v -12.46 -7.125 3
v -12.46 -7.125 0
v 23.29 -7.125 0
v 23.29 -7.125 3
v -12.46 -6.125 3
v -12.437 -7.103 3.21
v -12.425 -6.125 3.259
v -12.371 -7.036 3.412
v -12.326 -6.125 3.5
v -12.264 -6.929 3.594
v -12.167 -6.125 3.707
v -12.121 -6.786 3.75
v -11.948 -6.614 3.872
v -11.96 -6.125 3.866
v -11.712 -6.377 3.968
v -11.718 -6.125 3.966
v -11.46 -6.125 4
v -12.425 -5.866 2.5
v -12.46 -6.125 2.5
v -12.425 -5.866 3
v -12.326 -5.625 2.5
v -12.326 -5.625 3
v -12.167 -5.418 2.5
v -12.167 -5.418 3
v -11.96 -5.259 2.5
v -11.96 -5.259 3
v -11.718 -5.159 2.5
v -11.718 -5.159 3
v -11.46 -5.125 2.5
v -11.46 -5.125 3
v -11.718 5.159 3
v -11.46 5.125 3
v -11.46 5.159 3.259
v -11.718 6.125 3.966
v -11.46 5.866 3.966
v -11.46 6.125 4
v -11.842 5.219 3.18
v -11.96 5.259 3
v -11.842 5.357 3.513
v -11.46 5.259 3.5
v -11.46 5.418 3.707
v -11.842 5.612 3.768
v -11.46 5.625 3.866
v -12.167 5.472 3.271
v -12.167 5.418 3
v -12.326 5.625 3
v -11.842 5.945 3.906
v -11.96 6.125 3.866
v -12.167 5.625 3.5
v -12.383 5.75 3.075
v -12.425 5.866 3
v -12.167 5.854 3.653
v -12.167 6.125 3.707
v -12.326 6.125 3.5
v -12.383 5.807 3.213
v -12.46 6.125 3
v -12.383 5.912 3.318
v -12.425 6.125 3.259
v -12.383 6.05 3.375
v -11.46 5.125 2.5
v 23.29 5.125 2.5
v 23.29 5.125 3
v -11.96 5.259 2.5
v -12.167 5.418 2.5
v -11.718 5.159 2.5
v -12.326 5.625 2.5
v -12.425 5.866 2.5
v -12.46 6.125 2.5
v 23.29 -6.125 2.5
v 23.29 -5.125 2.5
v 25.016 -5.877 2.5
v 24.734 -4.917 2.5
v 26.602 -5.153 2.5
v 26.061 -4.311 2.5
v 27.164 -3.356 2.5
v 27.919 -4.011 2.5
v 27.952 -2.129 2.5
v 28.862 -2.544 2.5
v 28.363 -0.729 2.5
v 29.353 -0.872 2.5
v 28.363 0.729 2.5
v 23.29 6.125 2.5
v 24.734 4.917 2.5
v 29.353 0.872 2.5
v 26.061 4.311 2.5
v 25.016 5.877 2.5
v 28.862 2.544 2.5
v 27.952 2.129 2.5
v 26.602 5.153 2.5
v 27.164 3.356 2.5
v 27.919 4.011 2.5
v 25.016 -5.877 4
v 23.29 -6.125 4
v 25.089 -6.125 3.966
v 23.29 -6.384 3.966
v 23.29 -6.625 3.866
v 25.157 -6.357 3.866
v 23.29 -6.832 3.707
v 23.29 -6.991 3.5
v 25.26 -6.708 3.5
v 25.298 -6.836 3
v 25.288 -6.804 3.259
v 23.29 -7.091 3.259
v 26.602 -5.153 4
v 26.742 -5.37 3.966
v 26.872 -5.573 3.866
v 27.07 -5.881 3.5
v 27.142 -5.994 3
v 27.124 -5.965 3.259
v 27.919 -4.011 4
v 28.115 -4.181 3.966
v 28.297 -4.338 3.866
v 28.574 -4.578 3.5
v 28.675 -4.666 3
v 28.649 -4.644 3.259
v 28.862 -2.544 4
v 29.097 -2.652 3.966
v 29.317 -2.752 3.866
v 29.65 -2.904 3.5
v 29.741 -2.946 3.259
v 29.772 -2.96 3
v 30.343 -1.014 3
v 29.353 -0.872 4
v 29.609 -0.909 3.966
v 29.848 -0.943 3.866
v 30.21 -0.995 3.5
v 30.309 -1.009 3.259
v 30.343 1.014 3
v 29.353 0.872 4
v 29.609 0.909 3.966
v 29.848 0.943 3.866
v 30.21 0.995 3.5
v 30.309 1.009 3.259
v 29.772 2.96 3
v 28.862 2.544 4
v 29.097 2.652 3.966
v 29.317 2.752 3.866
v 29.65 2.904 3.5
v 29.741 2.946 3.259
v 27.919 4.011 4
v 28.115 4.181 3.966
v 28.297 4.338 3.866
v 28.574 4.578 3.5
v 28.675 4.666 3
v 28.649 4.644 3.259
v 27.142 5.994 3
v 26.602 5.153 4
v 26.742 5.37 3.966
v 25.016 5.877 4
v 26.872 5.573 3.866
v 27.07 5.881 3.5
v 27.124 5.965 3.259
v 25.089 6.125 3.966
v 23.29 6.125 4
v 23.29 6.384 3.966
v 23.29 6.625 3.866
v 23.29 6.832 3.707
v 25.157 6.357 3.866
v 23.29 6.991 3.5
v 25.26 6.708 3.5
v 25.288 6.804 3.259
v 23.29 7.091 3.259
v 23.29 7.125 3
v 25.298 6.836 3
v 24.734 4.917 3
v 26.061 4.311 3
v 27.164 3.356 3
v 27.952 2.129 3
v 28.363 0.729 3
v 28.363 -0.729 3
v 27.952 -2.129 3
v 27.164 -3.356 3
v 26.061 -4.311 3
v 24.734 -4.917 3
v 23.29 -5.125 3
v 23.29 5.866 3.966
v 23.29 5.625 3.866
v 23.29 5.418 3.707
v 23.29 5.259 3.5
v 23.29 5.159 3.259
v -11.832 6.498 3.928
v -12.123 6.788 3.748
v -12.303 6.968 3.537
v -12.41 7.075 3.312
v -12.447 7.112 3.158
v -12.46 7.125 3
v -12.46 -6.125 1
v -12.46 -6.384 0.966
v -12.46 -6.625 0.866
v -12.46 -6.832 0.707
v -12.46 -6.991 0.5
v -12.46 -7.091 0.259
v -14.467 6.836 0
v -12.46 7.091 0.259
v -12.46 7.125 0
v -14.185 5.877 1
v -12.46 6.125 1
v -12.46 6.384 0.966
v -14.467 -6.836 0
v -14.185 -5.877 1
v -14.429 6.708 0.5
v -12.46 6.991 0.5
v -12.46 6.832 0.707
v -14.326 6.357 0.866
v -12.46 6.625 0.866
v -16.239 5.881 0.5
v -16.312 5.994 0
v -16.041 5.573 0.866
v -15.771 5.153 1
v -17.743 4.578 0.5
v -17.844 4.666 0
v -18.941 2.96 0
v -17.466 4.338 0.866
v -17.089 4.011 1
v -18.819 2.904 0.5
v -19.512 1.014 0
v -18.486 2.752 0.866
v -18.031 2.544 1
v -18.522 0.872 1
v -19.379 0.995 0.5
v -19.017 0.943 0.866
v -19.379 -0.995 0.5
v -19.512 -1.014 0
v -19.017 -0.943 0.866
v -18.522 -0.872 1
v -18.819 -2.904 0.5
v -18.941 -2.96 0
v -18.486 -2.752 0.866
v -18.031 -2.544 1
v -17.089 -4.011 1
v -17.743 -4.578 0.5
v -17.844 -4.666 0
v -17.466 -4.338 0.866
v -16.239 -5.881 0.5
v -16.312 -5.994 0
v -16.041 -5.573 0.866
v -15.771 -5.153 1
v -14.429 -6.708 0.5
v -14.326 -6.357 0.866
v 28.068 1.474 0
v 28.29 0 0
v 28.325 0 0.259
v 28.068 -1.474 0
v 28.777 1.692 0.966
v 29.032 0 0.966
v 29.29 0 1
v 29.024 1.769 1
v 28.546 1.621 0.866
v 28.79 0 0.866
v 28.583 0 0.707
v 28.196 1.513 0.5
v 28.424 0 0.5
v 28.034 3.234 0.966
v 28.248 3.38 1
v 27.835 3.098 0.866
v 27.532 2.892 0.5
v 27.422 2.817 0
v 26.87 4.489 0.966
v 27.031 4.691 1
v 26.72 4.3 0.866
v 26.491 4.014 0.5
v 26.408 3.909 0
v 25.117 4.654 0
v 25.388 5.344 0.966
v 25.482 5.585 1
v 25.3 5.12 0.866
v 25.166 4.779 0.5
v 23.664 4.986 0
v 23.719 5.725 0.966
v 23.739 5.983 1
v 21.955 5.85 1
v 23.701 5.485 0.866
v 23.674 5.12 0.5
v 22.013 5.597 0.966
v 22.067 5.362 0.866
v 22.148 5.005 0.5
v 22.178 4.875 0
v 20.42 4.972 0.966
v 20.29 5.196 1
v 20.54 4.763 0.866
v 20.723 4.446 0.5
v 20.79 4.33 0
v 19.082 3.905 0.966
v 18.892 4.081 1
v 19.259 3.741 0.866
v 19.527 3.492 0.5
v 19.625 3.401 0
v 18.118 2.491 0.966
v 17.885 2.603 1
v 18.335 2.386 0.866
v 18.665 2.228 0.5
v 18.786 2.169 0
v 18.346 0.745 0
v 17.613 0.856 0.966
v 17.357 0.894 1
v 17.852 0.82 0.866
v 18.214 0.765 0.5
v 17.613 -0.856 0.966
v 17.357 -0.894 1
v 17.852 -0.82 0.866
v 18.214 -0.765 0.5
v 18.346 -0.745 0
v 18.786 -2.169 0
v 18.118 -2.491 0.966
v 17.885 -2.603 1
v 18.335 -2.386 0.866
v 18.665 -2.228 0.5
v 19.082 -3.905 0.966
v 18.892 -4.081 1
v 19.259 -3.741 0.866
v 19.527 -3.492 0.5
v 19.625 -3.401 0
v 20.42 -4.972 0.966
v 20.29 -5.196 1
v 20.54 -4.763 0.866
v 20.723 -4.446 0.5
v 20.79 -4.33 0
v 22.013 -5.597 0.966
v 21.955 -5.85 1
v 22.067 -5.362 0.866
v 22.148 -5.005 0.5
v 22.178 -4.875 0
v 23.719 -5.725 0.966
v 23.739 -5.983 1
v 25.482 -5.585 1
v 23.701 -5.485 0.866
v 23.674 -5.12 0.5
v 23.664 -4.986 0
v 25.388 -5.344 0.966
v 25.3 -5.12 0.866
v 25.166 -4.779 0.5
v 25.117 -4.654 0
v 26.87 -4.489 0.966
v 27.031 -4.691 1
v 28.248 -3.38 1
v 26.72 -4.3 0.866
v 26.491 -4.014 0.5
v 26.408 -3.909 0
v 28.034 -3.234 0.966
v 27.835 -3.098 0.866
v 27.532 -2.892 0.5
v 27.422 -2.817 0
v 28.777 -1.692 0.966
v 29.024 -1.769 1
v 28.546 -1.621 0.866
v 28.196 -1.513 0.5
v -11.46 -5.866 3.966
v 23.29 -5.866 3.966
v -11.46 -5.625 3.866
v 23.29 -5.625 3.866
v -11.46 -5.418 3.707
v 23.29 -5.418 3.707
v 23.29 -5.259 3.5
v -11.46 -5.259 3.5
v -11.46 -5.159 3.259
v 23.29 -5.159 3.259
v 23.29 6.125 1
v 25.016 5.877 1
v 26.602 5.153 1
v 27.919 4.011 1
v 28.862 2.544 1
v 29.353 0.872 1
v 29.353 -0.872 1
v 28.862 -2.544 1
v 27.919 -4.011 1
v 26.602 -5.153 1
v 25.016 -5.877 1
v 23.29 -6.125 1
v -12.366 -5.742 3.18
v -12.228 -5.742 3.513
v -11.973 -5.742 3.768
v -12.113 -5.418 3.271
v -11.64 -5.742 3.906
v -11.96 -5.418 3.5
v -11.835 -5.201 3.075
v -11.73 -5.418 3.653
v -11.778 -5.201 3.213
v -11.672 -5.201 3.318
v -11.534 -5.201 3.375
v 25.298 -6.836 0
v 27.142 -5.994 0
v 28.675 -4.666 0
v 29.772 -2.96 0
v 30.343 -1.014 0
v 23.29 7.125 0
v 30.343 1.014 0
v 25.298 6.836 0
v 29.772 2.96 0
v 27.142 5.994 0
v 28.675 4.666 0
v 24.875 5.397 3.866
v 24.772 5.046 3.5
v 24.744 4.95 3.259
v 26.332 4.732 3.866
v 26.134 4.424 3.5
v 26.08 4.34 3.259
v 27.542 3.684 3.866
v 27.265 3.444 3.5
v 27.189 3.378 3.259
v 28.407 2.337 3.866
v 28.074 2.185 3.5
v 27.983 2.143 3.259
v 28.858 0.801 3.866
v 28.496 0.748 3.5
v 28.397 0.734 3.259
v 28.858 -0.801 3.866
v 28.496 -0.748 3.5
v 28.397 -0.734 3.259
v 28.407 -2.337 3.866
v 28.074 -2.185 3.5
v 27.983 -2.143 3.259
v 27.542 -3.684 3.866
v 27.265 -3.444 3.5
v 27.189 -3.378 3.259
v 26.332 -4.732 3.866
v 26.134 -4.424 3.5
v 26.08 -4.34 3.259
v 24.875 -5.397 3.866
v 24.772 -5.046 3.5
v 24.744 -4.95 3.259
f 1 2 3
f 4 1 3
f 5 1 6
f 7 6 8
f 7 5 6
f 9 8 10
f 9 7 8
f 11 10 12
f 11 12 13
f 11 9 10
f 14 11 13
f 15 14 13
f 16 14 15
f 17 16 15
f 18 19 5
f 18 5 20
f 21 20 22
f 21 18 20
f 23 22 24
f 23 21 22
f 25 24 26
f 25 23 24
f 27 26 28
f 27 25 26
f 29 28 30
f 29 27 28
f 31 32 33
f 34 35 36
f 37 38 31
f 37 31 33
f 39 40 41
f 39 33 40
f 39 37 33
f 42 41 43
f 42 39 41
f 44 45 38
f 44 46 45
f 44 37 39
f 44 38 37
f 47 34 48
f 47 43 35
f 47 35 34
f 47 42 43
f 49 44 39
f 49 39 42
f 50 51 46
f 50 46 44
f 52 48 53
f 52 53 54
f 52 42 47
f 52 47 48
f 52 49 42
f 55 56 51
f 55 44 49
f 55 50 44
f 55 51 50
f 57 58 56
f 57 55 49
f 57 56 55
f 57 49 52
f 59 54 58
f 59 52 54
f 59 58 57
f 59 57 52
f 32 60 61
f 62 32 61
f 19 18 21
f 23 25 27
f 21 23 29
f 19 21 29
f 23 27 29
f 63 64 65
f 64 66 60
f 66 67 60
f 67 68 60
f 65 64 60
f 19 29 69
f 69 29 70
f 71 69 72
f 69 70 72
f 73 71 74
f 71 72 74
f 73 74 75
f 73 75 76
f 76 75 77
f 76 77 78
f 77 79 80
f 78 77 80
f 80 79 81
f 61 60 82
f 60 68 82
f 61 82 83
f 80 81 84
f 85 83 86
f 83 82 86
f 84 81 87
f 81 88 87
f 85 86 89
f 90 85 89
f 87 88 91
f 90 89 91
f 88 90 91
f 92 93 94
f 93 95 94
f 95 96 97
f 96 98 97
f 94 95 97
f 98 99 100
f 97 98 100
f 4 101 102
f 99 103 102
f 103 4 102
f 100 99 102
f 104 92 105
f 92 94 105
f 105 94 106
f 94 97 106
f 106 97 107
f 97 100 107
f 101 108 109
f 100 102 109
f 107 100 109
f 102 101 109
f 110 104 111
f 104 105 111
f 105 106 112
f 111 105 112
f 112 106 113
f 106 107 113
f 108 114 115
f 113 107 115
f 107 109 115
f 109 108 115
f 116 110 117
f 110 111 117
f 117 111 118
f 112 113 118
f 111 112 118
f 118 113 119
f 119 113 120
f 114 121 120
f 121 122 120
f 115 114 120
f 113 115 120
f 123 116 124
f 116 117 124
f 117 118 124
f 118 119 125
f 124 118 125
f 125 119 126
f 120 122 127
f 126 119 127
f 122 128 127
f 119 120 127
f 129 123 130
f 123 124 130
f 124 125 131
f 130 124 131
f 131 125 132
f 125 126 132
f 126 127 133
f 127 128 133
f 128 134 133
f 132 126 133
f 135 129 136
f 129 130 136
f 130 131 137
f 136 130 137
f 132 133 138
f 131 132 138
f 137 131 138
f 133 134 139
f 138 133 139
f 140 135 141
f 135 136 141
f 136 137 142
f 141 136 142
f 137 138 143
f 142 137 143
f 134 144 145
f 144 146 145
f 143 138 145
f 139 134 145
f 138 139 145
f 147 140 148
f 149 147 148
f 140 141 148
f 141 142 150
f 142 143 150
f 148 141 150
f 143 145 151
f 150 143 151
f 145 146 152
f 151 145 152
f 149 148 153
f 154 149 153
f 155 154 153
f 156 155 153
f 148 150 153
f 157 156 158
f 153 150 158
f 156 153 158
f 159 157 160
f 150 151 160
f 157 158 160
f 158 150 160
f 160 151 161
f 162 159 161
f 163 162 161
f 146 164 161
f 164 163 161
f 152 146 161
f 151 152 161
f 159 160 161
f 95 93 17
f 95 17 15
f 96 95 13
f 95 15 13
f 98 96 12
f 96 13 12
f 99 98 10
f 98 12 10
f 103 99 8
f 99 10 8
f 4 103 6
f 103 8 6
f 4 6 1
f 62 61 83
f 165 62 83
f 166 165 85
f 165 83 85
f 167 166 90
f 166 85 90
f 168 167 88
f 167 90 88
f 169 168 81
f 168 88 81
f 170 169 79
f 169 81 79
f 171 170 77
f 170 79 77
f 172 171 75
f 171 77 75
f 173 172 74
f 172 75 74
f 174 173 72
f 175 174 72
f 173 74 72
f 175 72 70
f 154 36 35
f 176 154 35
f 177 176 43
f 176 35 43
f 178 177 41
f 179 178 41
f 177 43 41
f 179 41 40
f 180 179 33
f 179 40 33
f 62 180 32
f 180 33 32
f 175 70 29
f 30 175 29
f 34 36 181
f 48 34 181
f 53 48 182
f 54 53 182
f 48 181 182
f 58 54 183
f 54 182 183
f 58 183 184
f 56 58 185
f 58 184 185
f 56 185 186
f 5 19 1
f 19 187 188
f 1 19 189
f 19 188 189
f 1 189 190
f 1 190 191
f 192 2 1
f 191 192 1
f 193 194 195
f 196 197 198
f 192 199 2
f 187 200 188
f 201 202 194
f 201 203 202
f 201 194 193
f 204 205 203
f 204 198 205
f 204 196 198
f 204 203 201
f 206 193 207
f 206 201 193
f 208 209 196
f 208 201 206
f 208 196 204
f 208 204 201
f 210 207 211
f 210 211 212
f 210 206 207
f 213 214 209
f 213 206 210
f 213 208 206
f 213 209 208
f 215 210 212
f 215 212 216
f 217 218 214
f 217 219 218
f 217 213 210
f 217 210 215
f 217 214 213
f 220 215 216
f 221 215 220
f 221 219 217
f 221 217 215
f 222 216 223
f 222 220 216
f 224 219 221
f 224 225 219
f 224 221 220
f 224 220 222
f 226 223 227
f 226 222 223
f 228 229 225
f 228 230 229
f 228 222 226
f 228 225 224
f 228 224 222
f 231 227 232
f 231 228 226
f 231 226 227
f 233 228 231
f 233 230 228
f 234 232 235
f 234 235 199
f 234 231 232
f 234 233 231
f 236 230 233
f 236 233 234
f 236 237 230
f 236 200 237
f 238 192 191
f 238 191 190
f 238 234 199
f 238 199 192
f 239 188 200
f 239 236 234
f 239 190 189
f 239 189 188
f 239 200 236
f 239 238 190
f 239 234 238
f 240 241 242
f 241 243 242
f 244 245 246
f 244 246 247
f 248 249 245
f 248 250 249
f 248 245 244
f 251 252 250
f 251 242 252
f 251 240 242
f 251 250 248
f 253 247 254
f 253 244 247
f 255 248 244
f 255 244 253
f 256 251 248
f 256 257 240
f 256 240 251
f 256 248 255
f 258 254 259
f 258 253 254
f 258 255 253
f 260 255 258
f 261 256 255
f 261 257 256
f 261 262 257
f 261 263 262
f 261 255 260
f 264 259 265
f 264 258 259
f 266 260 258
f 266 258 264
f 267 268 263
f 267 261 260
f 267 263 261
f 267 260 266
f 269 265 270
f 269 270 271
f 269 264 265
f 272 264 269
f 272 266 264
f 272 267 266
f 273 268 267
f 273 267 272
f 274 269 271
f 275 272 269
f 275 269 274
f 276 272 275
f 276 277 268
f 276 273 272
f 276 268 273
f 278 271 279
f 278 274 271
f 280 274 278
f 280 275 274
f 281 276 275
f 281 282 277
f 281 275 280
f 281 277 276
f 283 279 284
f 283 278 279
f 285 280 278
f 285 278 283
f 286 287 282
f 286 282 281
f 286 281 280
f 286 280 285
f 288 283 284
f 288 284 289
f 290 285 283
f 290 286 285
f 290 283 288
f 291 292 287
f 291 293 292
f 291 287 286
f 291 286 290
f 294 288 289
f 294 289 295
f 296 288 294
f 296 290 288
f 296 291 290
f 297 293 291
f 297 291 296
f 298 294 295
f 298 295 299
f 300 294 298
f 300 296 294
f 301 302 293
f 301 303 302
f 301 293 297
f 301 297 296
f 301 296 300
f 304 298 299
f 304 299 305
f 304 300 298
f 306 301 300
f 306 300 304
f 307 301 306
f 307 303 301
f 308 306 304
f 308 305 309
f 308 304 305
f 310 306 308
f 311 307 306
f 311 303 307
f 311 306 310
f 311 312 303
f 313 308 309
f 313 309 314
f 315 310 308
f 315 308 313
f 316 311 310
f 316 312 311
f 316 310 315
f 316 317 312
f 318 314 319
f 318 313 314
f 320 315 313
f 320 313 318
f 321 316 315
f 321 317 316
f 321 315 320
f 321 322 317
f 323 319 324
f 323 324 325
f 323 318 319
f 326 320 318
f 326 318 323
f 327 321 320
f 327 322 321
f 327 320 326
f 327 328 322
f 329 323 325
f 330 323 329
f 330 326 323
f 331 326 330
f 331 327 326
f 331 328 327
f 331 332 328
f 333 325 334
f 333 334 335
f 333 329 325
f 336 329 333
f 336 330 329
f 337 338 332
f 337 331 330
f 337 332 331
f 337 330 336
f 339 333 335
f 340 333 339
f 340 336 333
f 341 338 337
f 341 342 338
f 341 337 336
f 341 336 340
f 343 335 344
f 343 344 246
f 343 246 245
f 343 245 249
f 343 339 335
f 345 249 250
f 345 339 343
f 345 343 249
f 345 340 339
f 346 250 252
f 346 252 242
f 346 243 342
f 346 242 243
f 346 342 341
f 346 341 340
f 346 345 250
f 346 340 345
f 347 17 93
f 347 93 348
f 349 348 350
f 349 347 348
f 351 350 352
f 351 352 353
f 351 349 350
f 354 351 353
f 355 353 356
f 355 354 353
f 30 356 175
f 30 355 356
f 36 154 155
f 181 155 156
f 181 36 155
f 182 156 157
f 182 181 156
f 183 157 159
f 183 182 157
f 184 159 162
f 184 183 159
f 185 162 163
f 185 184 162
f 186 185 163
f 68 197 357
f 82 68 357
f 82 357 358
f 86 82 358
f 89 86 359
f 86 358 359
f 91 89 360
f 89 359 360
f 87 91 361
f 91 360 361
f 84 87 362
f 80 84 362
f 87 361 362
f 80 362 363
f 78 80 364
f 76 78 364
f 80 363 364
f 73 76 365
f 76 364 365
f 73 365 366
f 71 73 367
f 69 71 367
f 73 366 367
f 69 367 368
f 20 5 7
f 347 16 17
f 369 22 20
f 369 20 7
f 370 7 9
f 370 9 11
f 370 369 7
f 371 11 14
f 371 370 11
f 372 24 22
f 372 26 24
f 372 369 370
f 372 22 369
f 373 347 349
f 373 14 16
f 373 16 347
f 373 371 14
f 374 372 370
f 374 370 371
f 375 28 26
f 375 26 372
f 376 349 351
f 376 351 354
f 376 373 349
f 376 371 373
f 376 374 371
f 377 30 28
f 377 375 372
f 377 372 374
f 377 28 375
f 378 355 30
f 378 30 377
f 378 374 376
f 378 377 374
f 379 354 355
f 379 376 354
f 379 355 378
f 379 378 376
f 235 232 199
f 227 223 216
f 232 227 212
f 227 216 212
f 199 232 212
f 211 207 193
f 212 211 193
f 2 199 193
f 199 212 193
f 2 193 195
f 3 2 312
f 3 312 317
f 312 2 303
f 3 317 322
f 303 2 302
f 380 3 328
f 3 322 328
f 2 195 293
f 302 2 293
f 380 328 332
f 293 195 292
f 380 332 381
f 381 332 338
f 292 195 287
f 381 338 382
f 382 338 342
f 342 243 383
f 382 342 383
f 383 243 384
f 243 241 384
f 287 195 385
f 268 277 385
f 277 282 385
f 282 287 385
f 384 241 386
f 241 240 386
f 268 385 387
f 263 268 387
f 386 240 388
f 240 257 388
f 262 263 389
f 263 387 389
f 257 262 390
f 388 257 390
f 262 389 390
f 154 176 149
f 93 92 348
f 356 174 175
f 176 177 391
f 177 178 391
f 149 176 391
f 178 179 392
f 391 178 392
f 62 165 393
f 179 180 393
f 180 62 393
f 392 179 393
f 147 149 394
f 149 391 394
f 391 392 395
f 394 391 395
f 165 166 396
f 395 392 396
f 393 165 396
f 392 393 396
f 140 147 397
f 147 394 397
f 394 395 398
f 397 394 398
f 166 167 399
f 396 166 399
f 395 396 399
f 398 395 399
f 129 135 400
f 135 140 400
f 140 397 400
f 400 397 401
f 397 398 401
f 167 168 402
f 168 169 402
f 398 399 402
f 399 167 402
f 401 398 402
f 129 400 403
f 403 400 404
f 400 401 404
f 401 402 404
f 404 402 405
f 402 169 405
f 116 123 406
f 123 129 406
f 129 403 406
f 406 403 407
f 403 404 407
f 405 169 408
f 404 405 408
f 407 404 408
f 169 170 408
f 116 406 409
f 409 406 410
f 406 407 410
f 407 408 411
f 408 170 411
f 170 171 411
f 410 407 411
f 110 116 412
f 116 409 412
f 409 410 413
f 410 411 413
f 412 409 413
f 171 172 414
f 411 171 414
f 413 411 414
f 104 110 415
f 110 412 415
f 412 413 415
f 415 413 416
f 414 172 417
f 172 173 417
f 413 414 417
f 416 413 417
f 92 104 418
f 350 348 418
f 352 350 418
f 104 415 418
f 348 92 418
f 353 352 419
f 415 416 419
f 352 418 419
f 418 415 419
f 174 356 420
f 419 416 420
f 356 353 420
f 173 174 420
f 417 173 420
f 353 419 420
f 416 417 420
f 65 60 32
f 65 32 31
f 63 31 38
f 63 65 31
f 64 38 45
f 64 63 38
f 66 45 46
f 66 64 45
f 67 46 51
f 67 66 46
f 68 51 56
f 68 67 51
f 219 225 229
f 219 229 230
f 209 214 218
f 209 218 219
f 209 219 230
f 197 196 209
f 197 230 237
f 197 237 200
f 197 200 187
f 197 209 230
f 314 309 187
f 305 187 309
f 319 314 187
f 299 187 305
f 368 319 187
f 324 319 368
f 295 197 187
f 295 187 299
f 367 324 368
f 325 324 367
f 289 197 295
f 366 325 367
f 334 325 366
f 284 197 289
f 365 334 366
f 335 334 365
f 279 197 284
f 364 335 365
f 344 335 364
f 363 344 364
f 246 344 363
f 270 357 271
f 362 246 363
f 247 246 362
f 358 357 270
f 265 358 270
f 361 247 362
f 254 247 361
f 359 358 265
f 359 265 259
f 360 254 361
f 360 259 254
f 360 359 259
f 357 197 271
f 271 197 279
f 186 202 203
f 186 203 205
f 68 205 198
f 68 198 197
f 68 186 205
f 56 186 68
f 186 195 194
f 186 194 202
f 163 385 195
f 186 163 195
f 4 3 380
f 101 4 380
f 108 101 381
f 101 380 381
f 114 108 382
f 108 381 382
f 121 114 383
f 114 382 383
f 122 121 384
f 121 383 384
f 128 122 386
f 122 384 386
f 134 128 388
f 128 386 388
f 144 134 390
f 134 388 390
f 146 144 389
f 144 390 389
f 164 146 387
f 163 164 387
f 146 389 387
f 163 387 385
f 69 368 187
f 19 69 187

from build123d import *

# Parameters (mm, degrees)
F0_R         = 5
F1_DEPTH     = 1
F2_DEPTH     = 2.5
F4_DEPTH     = 1.5
F5_T1_DEPTH  = 35.75
F5_T3_DEPTH  = 1
F5_T5_DEPTH  = 34.75
F5_T7_DEPTH  = 1
F5_T9_DEPTH  = 0.5
F5_S13_W     = 1.02
F5_S13_H     = 1.02
F5_T14_DEPTH = 1.02
F5_S19_W     = 1.02
F5_S19_H     = 1.02
F5_T20_DEPTH = 1.02
F5_T24_ANGLE = 180
F5_T26_ANGLE = 180
F5_T30_ANGLE = 180
F5_T35_DEPTH = 3.5
F5_T39_DEPTH = 38.25
F5_T46_DEPTH = 38.25
F5_T50_DEPTH = 3.5


# Not quite as in the source:
# - a fillet or chamfer that OpenCascade refuses, or shapes differently, is made with other operations: its cross-section is extruded or revolved along the edge and cut away or added


with BuildPart() as f1:
    # F0 (on Top) → F1 (new body)
    with BuildSketch(Plane.XY):
        with BuildLine():
            Line((-12.4595724046, -6.125), (23.2904275954, -6.125))
            ThreePointArc((23.2904275954, -6.125), (29.4154275954, 0), (23.2904275954, 6.125))
            Line((23.2904275954, 6.125), (-12.4595724046, 6.125))
            ThreePointArc((-12.4595724046, 6.125), (-18.5845724046, 0), (-12.4595724046, -6.125))
        make_face()
        with Locations((23.2904275954, 0)):
            Circle(F0_R, mode=Mode.SUBTRACT)
        with BuildLine():
            Line((-12.4595724046, -7.125), (-12.4595724046, -6.125))
            ThreePointArc((-12.4595724046, -6.125), (-18.5845724046, 0), (-12.4595724046, 6.125))
            Line((-12.4595724046, 6.125), (-12.4595724046, 7.125))
            ThreePointArc((-12.4595724046, 7.125), (-19.5845724046, 0), (-12.4595724046, -7.125))
        make_face()
    extrude(amount=F1_DEPTH)

    # F0 (on Top) → F2 (join)
    with BuildSketch(Plane.XY):
        with BuildLine():
            ThreePointArc((23.2904275954, 6.125), (29.4154275954, 0), (23.2904275954, -6.125))
            Line((23.2904275954, -6.125), (-12.4595724046, -6.125))
            Line((-12.4595724046, -6.125), (-12.4595724046, -7.125))
            Line((-12.4595724046, -7.125), (23.2904275954, -7.125))
            ThreePointArc((23.2904275954, -7.125), (30.4154275954, 0), (23.2904275954, 7.125))
            Line((23.2904275954, 7.125), (-12.4595724046, 7.125))
            Line((-12.4595724046, 7.125), (-12.4595724046, 6.125))
            Line((-12.4595724046, 6.125), (23.2904275954, 6.125))
        make_face()
    extrude(amount=F2_DEPTH)

    # F3 (on face) → F4 (join)
    with BuildSketch(Plane.XY.offset(2.5)):
        with BuildLine():
            Line((-12.4595724046, -7.125), (23.2904275954, -7.125))
            ThreePointArc((23.2904275954, -7.125), (30.4154275954, 0), (23.2904275954, 7.125))
            Line((23.2904275954, 7.125), (-12.4595724046, 7.125))
            Line((-12.4595724046, 7.125), (-12.4595724046, 6.125))
            Line((-12.4595724046, 6.125), (23.2904275954, 6.125))
            ThreePointArc((23.2904275954, 6.125), (29.4154275954, 0), (23.2904275954, -6.125))
            Line((23.2904275954, -6.125), (-12.4595724046, -6.125))
            Line((-12.4595724046, -6.125), (-12.4595724046, -7.125))
        make_face()
        with BuildLine():
            Line((-12.4595724046, -5.125), (-12.4595724046, -6.125))
            Line((-12.4595724046, -6.125), (23.2904275954, -6.125))
            ThreePointArc((23.2904275954, -6.125), (29.4154275954, 0), (23.2904275954, 6.125))
            Line((23.2904275954, 6.125), (-12.4595724046, 6.125))
            Line((-12.4595724046, 6.125), (-12.4595724046, 5.125))
            Line((-12.4595724046, 5.125), (23.2904275954, 5.125))
            ThreePointArc((23.2904275954, 5.125), (28.4154275954, 0), (23.2904275954, -5.125))
            Line((23.2904275954, -5.125), (-12.4595724046, -5.125))
        make_face()
    extrude(amount=F4_DEPTH)

    # F5: fillet of radius 1 on 12 edges, made by hand

    # F5_s2 → F5_t1 (cut)
    with BuildSketch(Plane.YZ.offset(-12.4595724046)):
        with BuildLine():
            ThreePointArc((-6.125, 4), (-6.8321067812, 3.7071067812), (-7.125, 3))
            Line((-7.125, 3), (-7.145, 3))
            Line((-7.145, 3), (-7.145, 4.02))
            Line((-7.145, 4.02), (-6.125, 4.02))
            Line((-6.125, 4.02), (-6.125, 4))
        make_face()
        with BuildLine():
            ThreePointArc((6.125, 4), (6.8321067812, 3.7071067812), (7.125, 3))
            Line((7.125, 3), (7.145, 3))
            Line((7.145, 3), (7.145, 4.02))
            Line((7.145, 4.02), (6.125, 4.02))
            Line((6.125, 4.02), (6.125, 4))
        make_face()
    extrude(amount=F5_T1_DEPTH, mode=Mode.SUBTRACT)

    # F5_s4 → F5_t3 (cut)
    with BuildSketch(Plane.XZ.offset(-7.125)):
        with BuildLine():
            ThreePointArc((-11.4595724046, 4), (-12.1666791858, 3.7071067812), (-12.4595724046, 3))
            Line((-12.4595724046, 3), (-12.4795724046, 3))
            Line((-12.4795724046, 3), (-12.4795724046, 4.02))
            Line((-12.4795724046, 4.02), (-11.4595724046, 4.02))
            Line((-11.4595724046, 4.02), (-11.4595724046, 4))
        make_face()
    extrude(amount=F5_T3_DEPTH, mode=Mode.SUBTRACT)

    # F5_s6 → F5_t5 (cut)
    with BuildSketch(Plane.YZ.offset(-11.4595724046)):
        with BuildLine():
            ThreePointArc((6.125, 4), (5.4178932188, 3.7071067812), (5.125, 3))
            Line((5.125, 3), (5.105, 3))
            Line((5.105, 3), (5.105, 4.02))
            Line((5.105, 4.02), (6.125, 4.02))
            Line((6.125, 4.02), (6.125, 4))
        make_face()
        with BuildLine():
            ThreePointArc((-6.125, 4), (-5.4178932188, 3.7071067812), (-5.125, 3))
            Line((-5.125, 3), (-5.105, 3))
            Line((-5.105, 3), (-5.105, 4.02))
            Line((-5.105, 4.02), (-6.125, 4.02))
            Line((-6.125, 4.02), (-6.125, 4))
        make_face()
    extrude(amount=F5_T5_DEPTH, mode=Mode.SUBTRACT)

    # F5_s8 → F5_t7 (cut)
    with BuildSketch(Plane.XZ.offset(6.125)):
        with BuildLine():
            ThreePointArc((-12.4595724046, 3), (-12.1666791858, 3.7071067812), (-11.4595724046, 4))
            Line((-11.4595724046, 4), (-11.4595724046, 4.02))
            Line((-11.4595724046, 4.02), (-12.4795724046, 4.02))
            Line((-12.4795724046, 4.02), (-12.4795724046, 3))
            Line((-12.4795724046, 3), (-12.4595724046, 3))
        make_face()
    extrude(amount=F5_T7_DEPTH, mode=Mode.SUBTRACT)

    # F5_s10 → F5_t9 (cut)
    with BuildSketch(Plane.XY.offset(2.5)):
        with BuildLine():
            ThreePointArc((-12.4595724046, -6.125), (-12.1666791858, -5.4178932188), (-11.4595724046, -5.125))
            Line((-11.4595724046, -5.125), (-11.4595724046, -5.105))
            Line((-11.4595724046, -5.105), (-12.4795724046, -5.105))
            Line((-12.4795724046, -5.105), (-12.4795724046, -6.125))
            Line((-12.4795724046, -6.125), (-12.4595724046, -6.125))
        make_face()
        with BuildLine():
            ThreePointArc((-11.4595724046, 5.125), (-12.1666791858, 5.4178932188), (-12.4595724046, 6.125))
            Line((-12.4595724046, 6.125), (-12.4795724046, 6.125))
            Line((-12.4795724046, 6.125), (-12.4795724046, 5.105))
            Line((-12.4795724046, 5.105), (-11.4595724046, 5.105))
            Line((-11.4595724046, 5.105), (-11.4595724046, 5.125))
        make_face()
    extrude(amount=F5_T9_DEPTH, mode=Mode.SUBTRACT)


with BuildPart() as f5_tool12:
    # F5_s13 → F5_t14 (new body)
    with BuildSketch(Plane.YZ.offset(-11.4595724046)):
        with Locations((5.615, 3.51)):
            Rectangle(F5_S13_W, F5_S13_H)
    extrude(amount=-F5_T14_DEPTH)

    # F5_s15 → F5_t16 (revolve, cut)
    with BuildSketch(Plane(origin=(-11.4595724046, 6.125, 3), x_dir=(0, 0.7071067812, -0.7071067812), z_dir=(0, 0.7071067812, 0.7071067812))):
        with BuildLine():
            ThreePointArc((0, -1), (1, 0), (0, 1))
            Line((0, 1), (0, -1))
        make_face()
    revolve(axis=Axis((-11.4595724046, 6.125, 3), (-1, 0, 0)), mode=Mode.SUBTRACT)


with BuildPart() as f1_1:
    add(f1.part)

    # F5_t11: cut F5_tool12
    add(f5_tool12.part, mode=Mode.SUBTRACT)


with BuildPart() as f5_tool18:
    # F5_s19 → F5_t20 (new body)
    with BuildSketch(Plane.XZ.offset(6.125)):
        with Locations((-11.9695724046, 3.51)):
            Rectangle(F5_S19_W, F5_S19_H)
    extrude(amount=-F5_T20_DEPTH)

    # F5_s21 → F5_t22 (revolve, cut)
    with BuildSketch(Plane(origin=(-11.4595724046, -6.125, 3), x_dir=(0.7071067812, 0, -0.7071067812), z_dir=(0.7071067812, 0, 0.7071067812))):
        with BuildLine():
            ThreePointArc((0, -1), (1, 0), (0, 1))
            Line((0, 1), (0, -1))
        make_face()
    revolve(axis=Axis((-11.4595724046, -6.125, 3), (0, 1, 0)), mode=Mode.SUBTRACT)


with BuildPart() as f1_2:
    add(f1_1.part)

    # F5_t17: cut F5_tool18
    add(f5_tool18.part, mode=Mode.SUBTRACT)

    # F5_s23 → F5_t24 (revolve, cut)
    with BuildSketch(Plane.YZ.offset(23.2904275954)):
        with BuildLine():
            ThreePointArc((-6.125, 4), (-6.8321067812, 3.7071067812), (-7.125, 3))
            Line((-7.125, 3), (-7.145, 3))
            Line((-7.145, 3), (-7.145, 4.02))
            Line((-7.145, 4.02), (-6.125, 4.02))
            Line((-6.125, 4.02), (-6.125, 4))
        make_face()
    revolve(axis=Axis((23.2904275954, 0, 4), (0, 0, 1)), revolution_arc=F5_T24_ANGLE, mode=Mode.SUBTRACT)

    # F5_s25 → F5_t26 (revolve, cut)
    with BuildSketch(Plane.YZ.offset(23.2904275954)):
        with BuildLine():
            ThreePointArc((6.125, 4), (5.4178932188, 3.7071067812), (5.125, 3))
            Line((5.125, 3), (5.105, 3))
            Line((5.105, 3), (5.105, 4.02))
            Line((5.105, 4.02), (6.125, 4.02))
            Line((6.125, 4.02), (6.125, 4))
        make_face()
    revolve(axis=Axis((23.2904275954, 0, 4), (0, 0, -1)), revolution_arc=F5_T26_ANGLE, mode=Mode.SUBTRACT)

    # F5_s27 → F5_t28 (revolve, cut)
    with BuildSketch(Plane.XZ):
        with BuildLine():
            ThreePointArc((29.2904275954, 1), (28.5833208142, 0.7071067812), (28.2904275954, 0))
            Line((28.2904275954, 0), (28.2704275954, 0))
            Line((28.2704275954, 0), (28.2704275954, 1.02))
            Line((28.2704275954, 1.02), (29.2904275954, 1.02))
            Line((29.2904275954, 1.02), (29.2904275954, 1))
        make_face()
    revolve(axis=Axis((23.2904275954, 0, 1), (0, 0, 1)), mode=Mode.SUBTRACT)

    # F5_s29 → F5_t30 (revolve, cut)
    with BuildSketch(Plane.YZ.offset(-12.4595724046)):
        with BuildLine():
            ThreePointArc((7.125, 0), (6.8321067812, 0.7071067812), (6.125, 1))
            Line((6.125, 1), (6.125, 1.02))
            Line((6.125, 1.02), (7.145, 1.02))
            Line((7.145, 1.02), (7.145, 0))
            Line((7.145, 0), (7.125, 0))
        make_face()
    revolve(axis=Axis((-12.4595724046, 0, 1), (0, 0, 1)), revolution_arc=F5_T30_ANGLE, mode=Mode.SUBTRACT)


with BuildPart() as f5_tool33:
    # F5_s34 → F5_t35 (new body)
    with BuildSketch(Plane.XZ.offset(6.125)):
        with BuildLine():
            ThreePointArc((-12.4595724046, 3), (-12.1666791858, 3.7071067812), (-11.4595724046, 4))
            Line((-11.4595724046, 4), (-11.4595724046, 4.02))
            Line((-11.4595724046, 4.02), (-12.4795724046, 4.02))
            Line((-12.4795724046, 4.02), (-12.4795724046, 3))
            Line((-12.4795724046, 3), (-12.4595724046, 3))
        make_face()
    extrude(amount=F5_T35_DEPTH)

    split(bisect_by=Plane.XZ.offset(7.125), keep=Keep.TOP)


with BuildPart() as f5_tool37:
    # F5_s38 → F5_t39 (new body)
    with BuildSketch(Plane.YZ.offset(-14.9595724046)):
        with BuildLine():
            ThreePointArc((-6.125, 4), (-6.8321067812, 3.7071067812), (-7.125, 3))
            Line((-7.125, 3), (-7.145, 3))
            Line((-7.145, 3), (-7.145, 4.02))
            Line((-7.145, 4.02), (-6.125, 4.02))
            Line((-6.125, 4.02), (-6.125, 4))
        make_face()
    extrude(amount=F5_T39_DEPTH)

    split(bisect_by=Plane.YZ.offset(-12.4595724046), keep=Keep.BOTTOM)


with BuildPart() as f5_tool33_1:
    add(f5_tool33.part)

    # F5_t41: intersect F5_tool37
    add(f5_tool37.part, mode=Mode.INTERSECT)


with BuildPart() as f1_3:
    add(f1_2.part)

    # F5_t31: cut F5_tool33
    add(f5_tool33_1.part, mode=Mode.SUBTRACT)


with BuildPart() as f5_tool44:
    # F5_s45 → F5_t46 (new body)
    with BuildSketch(Plane.YZ.offset(23.2904275954)):
        with BuildLine():
            ThreePointArc((6.125, 4), (6.8321067812, 3.7071067812), (7.125, 3))
            Line((7.125, 3), (7.145, 3))
            Line((7.145, 3), (7.145, 4.02))
            Line((7.145, 4.02), (6.125, 4.02))
            Line((6.125, 4.02), (6.125, 4))
        make_face()
    extrude(amount=-F5_T46_DEPTH)

    split(bisect_by=Plane.YZ.offset(-12.4595724046), keep=Keep.BOTTOM)


with BuildPart() as f5_tool48:
    # F5_s49 → F5_t50 (new body)
    with BuildSketch(Plane.XZ.offset(-9.625)):
        with BuildLine():
            ThreePointArc((-11.4595724046, 4), (-12.1666791858, 3.7071067812), (-12.4595724046, 3))
            Line((-12.4595724046, 3), (-12.4795724046, 3))
            Line((-12.4795724046, 3), (-12.4795724046, 4.02))
            Line((-12.4795724046, 4.02), (-11.4595724046, 4.02))
            Line((-11.4595724046, 4.02), (-11.4595724046, 4))
        make_face()
    extrude(amount=F5_T50_DEPTH)

    split(bisect_by=Plane.XZ.offset(-7.125), keep=Keep.BOTTOM)


with BuildPart() as f5_tool44_1:
    add(f5_tool44.part)

    # F5_t52: intersect F5_tool48
    add(f5_tool48.part, mode=Mode.INTERSECT)


with BuildPart() as f1_4:
    add(f1_3.part)

    # F5_t42: cut F5_tool44
    add(f5_tool44_1.part, mode=Mode.SUBTRACT)


solid = f1_4.part
